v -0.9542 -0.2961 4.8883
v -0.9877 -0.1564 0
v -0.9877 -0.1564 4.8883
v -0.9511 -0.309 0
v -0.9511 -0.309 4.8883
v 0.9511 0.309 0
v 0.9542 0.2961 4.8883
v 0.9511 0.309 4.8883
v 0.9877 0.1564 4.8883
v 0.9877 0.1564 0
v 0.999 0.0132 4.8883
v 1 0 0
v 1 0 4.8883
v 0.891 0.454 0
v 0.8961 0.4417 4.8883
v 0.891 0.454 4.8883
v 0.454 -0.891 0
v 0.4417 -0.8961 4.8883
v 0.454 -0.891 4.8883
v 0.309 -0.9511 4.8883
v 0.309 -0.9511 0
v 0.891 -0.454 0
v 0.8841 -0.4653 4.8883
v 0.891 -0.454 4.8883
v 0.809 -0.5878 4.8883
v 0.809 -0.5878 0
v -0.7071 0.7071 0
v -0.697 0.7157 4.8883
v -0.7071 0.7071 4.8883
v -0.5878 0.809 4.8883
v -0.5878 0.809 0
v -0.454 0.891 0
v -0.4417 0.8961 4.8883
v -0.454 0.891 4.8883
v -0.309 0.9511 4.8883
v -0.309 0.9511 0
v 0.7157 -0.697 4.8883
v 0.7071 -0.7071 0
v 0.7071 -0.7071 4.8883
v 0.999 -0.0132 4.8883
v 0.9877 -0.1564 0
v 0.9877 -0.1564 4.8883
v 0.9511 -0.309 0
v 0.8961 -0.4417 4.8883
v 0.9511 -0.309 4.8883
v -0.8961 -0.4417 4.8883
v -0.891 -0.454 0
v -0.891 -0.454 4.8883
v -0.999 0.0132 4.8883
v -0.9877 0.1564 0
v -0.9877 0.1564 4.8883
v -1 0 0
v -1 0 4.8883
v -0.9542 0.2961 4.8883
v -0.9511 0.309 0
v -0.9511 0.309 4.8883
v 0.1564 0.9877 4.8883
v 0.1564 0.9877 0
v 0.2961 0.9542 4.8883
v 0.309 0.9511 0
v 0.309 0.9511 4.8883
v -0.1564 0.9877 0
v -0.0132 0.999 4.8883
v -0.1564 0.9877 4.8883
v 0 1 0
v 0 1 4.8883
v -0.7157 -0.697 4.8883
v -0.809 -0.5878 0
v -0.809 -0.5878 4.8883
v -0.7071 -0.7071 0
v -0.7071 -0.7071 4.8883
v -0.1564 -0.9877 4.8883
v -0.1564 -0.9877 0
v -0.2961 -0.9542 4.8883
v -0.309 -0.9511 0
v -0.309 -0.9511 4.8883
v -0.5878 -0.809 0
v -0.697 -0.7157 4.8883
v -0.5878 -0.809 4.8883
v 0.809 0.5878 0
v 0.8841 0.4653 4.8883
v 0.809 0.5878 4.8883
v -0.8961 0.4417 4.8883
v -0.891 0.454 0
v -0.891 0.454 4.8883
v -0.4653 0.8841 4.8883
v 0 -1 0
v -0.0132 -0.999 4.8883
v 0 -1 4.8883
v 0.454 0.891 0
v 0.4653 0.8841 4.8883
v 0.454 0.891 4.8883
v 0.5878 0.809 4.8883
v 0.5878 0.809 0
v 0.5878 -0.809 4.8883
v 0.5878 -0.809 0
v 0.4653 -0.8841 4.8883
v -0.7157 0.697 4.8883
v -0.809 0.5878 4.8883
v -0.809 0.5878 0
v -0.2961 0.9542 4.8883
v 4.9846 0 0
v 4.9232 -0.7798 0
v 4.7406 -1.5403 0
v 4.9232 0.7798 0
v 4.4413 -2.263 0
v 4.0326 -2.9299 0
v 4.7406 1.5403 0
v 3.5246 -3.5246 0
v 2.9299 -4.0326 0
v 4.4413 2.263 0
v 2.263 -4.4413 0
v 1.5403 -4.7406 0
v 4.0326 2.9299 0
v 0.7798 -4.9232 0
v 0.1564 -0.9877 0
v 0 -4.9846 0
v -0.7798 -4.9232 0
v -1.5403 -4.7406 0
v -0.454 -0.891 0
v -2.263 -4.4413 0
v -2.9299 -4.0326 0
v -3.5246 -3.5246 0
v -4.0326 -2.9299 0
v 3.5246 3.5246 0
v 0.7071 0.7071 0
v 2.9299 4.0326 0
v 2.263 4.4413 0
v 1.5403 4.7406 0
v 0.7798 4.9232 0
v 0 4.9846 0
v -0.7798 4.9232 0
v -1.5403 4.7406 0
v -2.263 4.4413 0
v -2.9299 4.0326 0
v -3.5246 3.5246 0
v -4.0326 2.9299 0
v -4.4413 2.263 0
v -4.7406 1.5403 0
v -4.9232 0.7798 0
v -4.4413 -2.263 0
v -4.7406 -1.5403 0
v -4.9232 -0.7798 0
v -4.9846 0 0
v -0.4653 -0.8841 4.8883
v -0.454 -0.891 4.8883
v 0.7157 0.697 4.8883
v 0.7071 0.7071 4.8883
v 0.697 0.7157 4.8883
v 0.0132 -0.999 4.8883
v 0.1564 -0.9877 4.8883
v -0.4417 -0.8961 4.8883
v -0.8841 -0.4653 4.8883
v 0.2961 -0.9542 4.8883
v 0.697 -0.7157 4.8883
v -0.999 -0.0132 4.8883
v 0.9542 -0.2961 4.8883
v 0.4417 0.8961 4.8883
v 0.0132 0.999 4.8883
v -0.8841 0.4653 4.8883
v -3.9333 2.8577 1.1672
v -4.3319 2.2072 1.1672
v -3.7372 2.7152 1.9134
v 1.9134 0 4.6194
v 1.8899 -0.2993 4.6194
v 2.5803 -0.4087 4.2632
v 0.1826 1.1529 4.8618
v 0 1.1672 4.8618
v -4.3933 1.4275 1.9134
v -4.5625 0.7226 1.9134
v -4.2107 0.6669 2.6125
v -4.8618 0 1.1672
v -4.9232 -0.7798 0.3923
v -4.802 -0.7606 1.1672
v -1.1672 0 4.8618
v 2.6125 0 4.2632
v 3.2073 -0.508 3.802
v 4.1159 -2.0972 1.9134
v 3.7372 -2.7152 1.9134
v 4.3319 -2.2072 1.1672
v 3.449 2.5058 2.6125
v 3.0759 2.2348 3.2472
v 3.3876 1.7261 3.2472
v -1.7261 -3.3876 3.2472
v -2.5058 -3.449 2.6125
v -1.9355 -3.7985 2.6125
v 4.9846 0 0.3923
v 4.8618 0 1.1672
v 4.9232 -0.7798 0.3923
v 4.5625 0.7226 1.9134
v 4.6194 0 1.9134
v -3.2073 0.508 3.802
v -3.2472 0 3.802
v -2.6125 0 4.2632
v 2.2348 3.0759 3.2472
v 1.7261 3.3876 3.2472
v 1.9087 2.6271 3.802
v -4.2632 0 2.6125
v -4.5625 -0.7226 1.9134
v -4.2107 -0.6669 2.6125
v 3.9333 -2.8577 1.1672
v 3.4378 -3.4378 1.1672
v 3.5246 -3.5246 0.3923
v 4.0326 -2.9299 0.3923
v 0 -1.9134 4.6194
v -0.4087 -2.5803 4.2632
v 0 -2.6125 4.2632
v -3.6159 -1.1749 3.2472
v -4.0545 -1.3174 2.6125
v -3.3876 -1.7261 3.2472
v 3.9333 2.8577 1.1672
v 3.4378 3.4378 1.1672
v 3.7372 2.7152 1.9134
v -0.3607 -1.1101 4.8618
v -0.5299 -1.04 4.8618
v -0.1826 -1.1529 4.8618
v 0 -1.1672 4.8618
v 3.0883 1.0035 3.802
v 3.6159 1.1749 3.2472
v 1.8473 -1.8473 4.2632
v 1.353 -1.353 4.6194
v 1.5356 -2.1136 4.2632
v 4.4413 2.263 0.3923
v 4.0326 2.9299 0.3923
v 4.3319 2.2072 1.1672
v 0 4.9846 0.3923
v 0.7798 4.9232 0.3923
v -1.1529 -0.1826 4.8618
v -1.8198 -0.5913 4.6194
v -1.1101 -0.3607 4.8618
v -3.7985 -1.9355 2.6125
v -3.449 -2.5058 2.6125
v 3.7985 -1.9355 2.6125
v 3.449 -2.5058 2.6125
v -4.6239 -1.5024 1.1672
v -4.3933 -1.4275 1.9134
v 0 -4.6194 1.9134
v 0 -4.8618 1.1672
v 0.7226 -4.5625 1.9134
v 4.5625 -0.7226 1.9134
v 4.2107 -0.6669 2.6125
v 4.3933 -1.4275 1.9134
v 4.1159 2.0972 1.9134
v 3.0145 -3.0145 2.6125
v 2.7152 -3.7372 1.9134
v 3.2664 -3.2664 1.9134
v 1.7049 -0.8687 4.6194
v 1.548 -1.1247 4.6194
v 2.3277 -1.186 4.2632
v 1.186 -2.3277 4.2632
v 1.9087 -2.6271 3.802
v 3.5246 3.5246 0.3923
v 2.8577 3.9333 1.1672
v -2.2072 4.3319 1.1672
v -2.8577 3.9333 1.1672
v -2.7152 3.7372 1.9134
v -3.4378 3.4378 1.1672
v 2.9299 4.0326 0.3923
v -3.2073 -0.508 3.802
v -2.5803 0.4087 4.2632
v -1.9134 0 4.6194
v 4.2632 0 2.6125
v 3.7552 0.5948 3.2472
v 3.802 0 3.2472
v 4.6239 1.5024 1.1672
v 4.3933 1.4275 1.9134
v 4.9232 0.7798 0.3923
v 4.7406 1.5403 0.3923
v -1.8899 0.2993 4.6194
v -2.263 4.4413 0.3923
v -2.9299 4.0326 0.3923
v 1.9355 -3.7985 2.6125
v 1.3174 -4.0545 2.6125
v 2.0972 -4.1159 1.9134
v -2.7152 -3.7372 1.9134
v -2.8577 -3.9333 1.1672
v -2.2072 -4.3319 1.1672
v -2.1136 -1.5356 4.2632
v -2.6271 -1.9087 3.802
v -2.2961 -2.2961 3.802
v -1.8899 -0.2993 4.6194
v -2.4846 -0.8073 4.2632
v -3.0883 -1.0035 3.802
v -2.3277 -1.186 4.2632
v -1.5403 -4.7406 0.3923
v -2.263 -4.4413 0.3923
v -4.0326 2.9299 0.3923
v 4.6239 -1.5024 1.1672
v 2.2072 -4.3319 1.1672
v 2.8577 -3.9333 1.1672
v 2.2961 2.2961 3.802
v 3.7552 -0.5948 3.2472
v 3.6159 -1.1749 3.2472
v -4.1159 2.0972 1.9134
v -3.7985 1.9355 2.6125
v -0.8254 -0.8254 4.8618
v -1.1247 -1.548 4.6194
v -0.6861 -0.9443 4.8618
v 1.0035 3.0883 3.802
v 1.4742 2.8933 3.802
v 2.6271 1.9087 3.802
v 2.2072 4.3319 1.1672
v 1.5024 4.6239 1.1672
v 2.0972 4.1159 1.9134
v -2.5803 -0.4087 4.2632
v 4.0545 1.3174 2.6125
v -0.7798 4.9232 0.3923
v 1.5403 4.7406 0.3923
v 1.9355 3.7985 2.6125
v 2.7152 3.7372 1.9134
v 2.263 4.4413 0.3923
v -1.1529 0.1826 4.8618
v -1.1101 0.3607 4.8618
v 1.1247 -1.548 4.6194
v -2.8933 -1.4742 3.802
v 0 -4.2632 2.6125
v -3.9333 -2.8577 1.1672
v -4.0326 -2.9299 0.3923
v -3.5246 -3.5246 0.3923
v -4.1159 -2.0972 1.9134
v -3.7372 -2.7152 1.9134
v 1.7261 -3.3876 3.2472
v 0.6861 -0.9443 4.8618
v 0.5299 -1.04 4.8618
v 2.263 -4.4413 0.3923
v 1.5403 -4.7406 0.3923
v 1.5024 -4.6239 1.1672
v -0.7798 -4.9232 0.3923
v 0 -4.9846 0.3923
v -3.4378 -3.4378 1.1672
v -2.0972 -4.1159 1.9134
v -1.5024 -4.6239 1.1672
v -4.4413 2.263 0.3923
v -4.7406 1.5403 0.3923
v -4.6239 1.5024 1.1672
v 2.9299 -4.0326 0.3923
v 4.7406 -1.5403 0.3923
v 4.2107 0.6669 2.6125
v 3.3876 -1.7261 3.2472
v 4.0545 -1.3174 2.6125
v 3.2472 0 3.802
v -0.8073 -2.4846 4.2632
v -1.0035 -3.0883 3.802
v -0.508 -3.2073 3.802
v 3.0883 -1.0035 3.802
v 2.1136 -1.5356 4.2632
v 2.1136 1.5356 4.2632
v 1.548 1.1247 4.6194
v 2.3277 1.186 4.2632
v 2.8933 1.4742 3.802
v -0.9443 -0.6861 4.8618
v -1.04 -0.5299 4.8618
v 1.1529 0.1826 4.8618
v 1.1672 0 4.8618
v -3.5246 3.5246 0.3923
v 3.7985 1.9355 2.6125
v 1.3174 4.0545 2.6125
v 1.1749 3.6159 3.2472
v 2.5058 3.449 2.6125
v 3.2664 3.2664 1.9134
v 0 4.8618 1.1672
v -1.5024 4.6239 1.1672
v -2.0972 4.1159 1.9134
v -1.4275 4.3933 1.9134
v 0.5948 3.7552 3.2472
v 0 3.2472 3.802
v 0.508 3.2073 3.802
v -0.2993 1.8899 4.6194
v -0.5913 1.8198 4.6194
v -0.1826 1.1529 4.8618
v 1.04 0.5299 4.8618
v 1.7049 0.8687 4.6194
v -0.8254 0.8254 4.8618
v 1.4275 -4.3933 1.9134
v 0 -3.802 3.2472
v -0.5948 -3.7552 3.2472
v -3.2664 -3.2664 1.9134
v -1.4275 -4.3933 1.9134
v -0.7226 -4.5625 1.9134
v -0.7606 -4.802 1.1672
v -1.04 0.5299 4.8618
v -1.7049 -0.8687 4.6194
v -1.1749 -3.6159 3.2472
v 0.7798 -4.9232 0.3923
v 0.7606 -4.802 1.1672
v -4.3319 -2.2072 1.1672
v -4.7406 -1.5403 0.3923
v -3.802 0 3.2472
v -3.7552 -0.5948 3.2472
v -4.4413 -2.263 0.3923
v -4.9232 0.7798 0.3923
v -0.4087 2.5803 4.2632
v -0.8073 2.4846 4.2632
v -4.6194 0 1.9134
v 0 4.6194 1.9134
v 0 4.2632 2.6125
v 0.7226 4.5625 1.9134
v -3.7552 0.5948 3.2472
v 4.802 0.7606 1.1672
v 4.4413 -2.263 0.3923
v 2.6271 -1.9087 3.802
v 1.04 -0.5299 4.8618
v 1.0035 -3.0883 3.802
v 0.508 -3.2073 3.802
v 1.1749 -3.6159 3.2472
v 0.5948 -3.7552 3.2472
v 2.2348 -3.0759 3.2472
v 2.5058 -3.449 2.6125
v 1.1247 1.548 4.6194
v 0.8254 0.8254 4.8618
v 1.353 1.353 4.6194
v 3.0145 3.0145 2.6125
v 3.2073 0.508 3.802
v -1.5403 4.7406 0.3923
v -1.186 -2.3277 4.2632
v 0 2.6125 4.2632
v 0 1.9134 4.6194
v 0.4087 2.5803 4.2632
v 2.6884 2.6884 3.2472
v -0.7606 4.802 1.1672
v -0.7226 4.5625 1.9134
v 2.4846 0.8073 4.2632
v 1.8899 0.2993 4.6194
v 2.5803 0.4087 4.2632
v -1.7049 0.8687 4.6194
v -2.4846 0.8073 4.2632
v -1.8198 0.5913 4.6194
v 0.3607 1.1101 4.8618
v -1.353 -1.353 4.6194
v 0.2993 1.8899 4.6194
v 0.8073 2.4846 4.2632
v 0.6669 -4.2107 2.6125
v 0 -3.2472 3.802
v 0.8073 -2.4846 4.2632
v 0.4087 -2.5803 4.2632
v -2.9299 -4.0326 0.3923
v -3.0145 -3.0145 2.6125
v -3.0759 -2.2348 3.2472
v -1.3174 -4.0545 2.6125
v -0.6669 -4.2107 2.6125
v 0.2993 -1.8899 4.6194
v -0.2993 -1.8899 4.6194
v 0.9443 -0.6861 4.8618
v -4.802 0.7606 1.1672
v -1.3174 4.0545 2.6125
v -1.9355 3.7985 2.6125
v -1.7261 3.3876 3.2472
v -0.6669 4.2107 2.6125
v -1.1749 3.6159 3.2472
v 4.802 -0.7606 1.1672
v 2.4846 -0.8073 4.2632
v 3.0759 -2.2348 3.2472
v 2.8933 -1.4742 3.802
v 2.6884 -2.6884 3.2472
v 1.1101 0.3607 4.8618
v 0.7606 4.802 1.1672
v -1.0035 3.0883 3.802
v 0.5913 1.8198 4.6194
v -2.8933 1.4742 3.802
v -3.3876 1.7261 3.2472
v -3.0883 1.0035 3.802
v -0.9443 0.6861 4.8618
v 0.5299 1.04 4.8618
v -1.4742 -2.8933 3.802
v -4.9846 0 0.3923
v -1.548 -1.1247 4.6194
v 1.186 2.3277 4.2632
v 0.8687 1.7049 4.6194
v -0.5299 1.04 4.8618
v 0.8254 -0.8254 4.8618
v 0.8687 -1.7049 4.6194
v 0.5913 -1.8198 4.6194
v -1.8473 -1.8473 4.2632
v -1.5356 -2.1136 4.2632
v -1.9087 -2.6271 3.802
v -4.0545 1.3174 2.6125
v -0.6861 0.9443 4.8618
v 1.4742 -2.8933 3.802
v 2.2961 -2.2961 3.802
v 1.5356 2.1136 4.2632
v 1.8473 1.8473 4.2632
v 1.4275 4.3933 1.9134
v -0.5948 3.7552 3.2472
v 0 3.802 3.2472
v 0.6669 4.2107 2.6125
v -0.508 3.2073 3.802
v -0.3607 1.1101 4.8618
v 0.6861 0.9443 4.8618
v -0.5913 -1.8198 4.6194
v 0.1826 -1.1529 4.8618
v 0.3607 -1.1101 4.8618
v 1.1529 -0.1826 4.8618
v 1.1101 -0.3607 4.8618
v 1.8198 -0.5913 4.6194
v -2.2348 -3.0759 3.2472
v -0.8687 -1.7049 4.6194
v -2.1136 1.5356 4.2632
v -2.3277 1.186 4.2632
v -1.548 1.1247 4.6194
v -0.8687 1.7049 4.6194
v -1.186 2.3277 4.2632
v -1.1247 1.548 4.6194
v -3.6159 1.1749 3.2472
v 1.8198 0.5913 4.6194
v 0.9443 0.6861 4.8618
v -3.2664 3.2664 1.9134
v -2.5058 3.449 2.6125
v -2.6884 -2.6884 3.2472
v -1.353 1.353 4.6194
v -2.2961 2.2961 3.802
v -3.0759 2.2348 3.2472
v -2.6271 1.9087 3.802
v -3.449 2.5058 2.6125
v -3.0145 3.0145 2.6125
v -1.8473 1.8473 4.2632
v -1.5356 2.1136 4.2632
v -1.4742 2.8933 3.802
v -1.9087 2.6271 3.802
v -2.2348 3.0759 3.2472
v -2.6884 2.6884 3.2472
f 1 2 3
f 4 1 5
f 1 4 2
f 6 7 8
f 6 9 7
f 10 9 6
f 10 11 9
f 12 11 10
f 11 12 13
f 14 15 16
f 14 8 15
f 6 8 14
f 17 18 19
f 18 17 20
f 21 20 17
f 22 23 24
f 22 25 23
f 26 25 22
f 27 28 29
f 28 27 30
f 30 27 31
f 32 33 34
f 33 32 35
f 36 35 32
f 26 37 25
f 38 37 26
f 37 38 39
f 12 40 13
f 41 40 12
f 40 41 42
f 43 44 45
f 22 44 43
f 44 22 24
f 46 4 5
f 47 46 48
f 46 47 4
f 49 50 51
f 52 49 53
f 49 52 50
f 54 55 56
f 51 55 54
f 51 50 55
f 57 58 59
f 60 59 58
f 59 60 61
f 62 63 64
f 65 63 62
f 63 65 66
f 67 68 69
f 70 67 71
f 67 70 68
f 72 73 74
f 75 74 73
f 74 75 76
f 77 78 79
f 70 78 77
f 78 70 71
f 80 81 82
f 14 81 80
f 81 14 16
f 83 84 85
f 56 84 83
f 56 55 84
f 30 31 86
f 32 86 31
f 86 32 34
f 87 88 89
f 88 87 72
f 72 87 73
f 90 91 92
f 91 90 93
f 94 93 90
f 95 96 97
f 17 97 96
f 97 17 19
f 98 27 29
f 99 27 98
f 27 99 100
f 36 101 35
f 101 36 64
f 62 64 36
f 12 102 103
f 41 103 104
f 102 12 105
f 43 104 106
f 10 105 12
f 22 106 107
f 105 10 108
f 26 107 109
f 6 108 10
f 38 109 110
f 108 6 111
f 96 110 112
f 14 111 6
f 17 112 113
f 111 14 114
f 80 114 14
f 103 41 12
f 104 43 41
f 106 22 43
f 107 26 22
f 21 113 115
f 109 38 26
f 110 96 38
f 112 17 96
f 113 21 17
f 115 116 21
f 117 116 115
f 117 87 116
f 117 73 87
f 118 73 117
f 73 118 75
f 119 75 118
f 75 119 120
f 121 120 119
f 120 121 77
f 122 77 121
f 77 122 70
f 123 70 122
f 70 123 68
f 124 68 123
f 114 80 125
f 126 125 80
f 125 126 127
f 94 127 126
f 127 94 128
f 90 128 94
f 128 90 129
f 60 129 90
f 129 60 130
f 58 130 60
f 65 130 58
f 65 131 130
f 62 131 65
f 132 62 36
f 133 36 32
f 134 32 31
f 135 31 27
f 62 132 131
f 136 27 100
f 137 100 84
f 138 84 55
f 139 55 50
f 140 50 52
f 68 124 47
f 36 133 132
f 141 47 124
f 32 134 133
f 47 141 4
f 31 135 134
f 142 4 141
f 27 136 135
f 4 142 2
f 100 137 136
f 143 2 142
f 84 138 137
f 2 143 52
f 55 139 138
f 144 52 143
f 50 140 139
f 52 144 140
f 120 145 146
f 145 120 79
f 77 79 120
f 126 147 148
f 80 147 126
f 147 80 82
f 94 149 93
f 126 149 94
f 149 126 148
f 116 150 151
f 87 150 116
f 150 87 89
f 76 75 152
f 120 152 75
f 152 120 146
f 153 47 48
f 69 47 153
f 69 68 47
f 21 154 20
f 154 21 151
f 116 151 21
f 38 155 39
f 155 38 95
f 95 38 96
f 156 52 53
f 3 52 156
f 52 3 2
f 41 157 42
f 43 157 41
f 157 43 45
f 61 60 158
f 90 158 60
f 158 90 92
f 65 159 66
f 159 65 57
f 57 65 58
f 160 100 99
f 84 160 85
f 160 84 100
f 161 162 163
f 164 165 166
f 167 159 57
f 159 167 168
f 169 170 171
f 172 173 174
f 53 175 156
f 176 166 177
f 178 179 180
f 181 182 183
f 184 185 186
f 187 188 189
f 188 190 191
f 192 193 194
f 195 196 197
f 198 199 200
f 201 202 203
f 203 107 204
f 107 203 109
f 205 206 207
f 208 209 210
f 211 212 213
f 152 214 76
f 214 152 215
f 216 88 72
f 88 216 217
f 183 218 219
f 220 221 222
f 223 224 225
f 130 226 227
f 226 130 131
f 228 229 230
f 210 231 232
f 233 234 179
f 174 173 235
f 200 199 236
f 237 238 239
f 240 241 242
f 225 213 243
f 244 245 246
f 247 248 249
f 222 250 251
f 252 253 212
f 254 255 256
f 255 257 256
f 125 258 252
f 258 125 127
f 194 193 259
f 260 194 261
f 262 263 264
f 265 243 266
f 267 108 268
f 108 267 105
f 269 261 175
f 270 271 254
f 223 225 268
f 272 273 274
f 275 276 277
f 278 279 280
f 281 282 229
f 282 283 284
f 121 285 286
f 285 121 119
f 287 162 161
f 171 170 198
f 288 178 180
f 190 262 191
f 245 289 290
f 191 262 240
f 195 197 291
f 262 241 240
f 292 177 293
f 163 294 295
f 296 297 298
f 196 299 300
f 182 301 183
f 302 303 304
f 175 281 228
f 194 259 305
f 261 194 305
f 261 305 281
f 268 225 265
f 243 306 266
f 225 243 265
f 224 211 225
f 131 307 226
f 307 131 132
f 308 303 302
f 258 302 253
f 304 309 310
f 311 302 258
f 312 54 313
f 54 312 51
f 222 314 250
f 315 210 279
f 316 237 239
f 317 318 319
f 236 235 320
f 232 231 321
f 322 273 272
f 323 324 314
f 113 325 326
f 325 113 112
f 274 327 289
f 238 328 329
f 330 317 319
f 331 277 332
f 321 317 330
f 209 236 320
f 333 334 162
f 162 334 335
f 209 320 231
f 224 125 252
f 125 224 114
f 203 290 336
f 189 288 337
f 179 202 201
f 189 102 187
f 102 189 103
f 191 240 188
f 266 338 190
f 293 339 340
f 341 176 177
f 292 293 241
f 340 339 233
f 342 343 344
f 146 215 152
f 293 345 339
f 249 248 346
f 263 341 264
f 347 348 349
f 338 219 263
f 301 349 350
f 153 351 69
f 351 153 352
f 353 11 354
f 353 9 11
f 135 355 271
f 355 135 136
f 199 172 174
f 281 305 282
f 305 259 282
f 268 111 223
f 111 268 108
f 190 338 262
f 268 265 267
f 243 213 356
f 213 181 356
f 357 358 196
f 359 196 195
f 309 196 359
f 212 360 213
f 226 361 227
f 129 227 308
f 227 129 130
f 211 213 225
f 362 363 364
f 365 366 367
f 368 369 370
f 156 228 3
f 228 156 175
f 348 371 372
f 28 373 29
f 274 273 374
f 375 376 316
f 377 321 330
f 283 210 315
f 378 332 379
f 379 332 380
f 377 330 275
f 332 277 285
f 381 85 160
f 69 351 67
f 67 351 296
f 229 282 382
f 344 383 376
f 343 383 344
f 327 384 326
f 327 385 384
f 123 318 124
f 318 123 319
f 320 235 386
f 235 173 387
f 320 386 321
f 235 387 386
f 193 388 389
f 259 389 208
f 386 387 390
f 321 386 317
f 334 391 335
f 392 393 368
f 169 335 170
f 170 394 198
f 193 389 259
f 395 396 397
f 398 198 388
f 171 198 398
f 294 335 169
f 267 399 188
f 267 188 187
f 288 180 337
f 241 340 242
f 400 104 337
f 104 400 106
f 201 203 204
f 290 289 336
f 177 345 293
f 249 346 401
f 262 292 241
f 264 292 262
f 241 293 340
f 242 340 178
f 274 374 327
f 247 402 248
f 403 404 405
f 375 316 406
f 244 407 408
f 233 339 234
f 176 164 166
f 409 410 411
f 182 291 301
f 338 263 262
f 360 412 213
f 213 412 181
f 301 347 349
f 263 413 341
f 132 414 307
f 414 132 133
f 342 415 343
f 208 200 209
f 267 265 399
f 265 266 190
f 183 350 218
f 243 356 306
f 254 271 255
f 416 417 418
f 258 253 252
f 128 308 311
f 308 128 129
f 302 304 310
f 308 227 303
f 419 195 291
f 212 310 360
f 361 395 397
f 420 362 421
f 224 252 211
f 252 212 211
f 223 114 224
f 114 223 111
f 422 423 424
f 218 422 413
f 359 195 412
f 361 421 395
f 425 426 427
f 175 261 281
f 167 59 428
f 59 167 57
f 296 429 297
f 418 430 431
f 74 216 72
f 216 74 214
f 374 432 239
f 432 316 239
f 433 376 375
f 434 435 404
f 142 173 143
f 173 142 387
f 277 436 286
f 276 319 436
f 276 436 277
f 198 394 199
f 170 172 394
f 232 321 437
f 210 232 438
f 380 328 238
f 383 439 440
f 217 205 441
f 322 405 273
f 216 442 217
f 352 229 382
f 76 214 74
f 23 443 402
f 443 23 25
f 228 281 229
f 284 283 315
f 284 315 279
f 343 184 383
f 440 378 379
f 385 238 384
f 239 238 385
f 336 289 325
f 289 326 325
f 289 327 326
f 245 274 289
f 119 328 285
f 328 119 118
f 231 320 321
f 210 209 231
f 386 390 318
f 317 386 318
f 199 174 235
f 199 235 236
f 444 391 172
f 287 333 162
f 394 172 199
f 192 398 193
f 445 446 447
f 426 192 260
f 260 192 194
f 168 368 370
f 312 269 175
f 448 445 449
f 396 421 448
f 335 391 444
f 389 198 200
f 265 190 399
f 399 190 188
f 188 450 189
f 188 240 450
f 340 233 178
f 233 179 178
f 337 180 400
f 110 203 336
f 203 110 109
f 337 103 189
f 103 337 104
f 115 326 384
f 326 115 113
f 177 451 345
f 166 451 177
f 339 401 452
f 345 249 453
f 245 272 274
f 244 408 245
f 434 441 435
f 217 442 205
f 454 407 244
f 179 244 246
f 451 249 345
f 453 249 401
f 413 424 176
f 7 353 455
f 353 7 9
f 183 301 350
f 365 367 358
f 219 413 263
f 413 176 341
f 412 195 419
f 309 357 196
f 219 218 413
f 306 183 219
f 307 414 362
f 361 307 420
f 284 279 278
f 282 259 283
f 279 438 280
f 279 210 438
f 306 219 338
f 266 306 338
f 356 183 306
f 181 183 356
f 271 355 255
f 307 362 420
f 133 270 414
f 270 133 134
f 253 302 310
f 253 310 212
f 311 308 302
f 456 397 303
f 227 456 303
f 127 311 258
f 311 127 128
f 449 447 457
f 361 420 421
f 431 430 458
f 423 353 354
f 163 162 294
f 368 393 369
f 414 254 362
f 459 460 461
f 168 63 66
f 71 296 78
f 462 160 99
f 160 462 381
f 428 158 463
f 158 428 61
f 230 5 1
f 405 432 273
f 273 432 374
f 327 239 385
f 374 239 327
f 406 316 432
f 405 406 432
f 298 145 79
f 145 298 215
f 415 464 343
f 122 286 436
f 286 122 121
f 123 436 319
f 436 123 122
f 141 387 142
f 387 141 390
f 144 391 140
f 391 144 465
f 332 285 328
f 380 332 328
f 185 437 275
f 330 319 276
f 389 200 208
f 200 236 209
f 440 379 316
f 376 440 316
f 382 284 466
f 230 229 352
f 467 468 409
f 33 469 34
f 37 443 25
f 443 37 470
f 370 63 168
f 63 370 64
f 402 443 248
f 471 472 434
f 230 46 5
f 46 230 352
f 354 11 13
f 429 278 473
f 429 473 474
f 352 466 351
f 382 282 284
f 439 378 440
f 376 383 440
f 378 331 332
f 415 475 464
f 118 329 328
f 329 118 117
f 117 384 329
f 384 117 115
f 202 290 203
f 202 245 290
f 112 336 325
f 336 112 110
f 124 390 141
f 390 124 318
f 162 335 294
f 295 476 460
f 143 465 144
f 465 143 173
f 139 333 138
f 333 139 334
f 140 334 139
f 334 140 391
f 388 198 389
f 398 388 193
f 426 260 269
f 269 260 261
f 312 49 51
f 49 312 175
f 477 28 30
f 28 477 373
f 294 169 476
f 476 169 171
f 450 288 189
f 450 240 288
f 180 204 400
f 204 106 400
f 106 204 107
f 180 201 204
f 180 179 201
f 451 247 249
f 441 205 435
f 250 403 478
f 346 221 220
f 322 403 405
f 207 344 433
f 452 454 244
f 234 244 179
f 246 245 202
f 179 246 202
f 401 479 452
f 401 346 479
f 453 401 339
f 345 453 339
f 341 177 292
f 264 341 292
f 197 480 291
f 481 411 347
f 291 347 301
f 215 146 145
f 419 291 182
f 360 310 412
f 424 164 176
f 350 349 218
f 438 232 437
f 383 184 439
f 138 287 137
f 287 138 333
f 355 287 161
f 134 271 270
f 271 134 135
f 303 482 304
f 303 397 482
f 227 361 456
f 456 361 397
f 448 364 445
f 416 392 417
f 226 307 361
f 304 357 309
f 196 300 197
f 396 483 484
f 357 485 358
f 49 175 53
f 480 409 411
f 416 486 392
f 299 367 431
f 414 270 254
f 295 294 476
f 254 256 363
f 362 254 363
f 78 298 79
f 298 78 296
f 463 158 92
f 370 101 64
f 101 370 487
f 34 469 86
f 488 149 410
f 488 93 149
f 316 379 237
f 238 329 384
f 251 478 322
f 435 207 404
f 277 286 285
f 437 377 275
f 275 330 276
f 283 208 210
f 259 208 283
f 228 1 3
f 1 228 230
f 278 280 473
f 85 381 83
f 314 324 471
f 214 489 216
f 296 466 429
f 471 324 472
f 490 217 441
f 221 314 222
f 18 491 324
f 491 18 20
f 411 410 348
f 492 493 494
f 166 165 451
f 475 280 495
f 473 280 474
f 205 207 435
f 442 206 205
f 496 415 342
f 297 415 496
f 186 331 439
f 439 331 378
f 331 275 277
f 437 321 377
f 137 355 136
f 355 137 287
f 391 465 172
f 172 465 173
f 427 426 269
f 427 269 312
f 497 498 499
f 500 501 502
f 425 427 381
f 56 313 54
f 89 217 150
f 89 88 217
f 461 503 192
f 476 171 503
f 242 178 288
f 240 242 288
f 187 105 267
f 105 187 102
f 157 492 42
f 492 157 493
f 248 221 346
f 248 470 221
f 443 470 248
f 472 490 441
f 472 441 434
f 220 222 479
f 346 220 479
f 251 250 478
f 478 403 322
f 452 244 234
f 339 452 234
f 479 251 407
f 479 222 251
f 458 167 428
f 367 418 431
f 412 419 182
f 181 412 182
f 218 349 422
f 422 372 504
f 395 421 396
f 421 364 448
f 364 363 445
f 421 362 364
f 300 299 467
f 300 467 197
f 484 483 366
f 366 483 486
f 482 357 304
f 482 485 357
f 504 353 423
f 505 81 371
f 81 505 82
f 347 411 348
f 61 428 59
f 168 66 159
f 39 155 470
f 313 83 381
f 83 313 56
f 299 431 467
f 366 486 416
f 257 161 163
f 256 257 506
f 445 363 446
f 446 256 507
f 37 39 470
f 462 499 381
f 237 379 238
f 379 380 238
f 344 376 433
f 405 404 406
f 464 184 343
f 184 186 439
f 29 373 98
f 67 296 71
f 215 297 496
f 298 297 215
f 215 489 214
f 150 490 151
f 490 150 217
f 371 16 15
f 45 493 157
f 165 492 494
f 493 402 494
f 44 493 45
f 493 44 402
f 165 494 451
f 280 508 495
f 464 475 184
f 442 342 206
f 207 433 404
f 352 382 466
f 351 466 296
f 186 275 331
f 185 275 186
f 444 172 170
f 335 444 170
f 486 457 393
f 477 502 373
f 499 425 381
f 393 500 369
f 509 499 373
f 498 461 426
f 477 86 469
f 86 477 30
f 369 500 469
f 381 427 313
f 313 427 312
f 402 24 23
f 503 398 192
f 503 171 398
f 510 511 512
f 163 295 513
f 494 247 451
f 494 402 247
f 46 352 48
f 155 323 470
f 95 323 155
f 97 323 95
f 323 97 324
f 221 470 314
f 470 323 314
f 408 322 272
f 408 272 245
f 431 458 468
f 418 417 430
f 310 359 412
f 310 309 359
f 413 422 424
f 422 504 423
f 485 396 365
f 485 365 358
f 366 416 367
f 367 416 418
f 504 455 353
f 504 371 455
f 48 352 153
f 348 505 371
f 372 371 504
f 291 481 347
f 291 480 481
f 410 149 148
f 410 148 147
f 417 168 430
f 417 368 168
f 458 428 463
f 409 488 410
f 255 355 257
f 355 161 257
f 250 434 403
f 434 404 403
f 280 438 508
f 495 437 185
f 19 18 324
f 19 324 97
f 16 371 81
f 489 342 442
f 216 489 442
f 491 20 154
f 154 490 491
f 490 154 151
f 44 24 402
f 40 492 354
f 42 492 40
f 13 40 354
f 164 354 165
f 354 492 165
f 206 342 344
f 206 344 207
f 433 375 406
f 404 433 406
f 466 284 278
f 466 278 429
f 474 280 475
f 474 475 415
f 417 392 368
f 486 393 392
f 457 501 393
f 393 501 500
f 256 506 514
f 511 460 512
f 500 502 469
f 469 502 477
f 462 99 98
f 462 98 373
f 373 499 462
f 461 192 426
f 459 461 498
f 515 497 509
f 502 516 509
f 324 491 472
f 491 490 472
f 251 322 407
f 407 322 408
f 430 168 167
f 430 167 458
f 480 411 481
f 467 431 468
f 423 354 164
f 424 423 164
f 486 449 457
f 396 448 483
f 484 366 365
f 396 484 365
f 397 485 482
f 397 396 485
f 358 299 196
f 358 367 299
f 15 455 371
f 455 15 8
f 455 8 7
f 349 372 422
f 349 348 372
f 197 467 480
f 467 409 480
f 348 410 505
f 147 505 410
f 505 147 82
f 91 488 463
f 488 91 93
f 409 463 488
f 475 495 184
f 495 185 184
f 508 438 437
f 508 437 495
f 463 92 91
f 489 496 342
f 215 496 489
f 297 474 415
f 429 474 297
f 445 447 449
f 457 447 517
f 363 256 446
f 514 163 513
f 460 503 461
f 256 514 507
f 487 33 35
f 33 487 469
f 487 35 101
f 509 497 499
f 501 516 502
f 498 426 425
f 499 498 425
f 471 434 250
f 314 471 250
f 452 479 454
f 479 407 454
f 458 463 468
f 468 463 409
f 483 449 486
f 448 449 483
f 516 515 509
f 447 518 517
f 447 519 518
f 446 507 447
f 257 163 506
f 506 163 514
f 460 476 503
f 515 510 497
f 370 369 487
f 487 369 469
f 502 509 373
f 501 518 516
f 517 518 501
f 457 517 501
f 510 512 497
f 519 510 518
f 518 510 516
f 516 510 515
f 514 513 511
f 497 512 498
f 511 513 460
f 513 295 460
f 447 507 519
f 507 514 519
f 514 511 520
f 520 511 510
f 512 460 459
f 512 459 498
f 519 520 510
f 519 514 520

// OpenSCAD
electrodeD = 10;
electrodeOpening = 2;
electrodeH = 2;

$fn=40;

module electrode(){
difference(){    
    sphere(d=electrodeD);
    union(){
        cylinder(d=electrodeOpening,h=electrodeD);
        translate([-electrodeD/2,-electrodeD/2,-electrodeD]){
            cube([electrodeD,electrodeD,electrodeD]);
            }//end translate
        }//end union
    }//end difference
}//end electrode module


module electrode_cap(){
    //some some
    }// end module electrode_cap
    
module gel_holder(){
    }// end module gel_holder

module clip_attachments(){
    }//end module clip_attachments


electrode();
